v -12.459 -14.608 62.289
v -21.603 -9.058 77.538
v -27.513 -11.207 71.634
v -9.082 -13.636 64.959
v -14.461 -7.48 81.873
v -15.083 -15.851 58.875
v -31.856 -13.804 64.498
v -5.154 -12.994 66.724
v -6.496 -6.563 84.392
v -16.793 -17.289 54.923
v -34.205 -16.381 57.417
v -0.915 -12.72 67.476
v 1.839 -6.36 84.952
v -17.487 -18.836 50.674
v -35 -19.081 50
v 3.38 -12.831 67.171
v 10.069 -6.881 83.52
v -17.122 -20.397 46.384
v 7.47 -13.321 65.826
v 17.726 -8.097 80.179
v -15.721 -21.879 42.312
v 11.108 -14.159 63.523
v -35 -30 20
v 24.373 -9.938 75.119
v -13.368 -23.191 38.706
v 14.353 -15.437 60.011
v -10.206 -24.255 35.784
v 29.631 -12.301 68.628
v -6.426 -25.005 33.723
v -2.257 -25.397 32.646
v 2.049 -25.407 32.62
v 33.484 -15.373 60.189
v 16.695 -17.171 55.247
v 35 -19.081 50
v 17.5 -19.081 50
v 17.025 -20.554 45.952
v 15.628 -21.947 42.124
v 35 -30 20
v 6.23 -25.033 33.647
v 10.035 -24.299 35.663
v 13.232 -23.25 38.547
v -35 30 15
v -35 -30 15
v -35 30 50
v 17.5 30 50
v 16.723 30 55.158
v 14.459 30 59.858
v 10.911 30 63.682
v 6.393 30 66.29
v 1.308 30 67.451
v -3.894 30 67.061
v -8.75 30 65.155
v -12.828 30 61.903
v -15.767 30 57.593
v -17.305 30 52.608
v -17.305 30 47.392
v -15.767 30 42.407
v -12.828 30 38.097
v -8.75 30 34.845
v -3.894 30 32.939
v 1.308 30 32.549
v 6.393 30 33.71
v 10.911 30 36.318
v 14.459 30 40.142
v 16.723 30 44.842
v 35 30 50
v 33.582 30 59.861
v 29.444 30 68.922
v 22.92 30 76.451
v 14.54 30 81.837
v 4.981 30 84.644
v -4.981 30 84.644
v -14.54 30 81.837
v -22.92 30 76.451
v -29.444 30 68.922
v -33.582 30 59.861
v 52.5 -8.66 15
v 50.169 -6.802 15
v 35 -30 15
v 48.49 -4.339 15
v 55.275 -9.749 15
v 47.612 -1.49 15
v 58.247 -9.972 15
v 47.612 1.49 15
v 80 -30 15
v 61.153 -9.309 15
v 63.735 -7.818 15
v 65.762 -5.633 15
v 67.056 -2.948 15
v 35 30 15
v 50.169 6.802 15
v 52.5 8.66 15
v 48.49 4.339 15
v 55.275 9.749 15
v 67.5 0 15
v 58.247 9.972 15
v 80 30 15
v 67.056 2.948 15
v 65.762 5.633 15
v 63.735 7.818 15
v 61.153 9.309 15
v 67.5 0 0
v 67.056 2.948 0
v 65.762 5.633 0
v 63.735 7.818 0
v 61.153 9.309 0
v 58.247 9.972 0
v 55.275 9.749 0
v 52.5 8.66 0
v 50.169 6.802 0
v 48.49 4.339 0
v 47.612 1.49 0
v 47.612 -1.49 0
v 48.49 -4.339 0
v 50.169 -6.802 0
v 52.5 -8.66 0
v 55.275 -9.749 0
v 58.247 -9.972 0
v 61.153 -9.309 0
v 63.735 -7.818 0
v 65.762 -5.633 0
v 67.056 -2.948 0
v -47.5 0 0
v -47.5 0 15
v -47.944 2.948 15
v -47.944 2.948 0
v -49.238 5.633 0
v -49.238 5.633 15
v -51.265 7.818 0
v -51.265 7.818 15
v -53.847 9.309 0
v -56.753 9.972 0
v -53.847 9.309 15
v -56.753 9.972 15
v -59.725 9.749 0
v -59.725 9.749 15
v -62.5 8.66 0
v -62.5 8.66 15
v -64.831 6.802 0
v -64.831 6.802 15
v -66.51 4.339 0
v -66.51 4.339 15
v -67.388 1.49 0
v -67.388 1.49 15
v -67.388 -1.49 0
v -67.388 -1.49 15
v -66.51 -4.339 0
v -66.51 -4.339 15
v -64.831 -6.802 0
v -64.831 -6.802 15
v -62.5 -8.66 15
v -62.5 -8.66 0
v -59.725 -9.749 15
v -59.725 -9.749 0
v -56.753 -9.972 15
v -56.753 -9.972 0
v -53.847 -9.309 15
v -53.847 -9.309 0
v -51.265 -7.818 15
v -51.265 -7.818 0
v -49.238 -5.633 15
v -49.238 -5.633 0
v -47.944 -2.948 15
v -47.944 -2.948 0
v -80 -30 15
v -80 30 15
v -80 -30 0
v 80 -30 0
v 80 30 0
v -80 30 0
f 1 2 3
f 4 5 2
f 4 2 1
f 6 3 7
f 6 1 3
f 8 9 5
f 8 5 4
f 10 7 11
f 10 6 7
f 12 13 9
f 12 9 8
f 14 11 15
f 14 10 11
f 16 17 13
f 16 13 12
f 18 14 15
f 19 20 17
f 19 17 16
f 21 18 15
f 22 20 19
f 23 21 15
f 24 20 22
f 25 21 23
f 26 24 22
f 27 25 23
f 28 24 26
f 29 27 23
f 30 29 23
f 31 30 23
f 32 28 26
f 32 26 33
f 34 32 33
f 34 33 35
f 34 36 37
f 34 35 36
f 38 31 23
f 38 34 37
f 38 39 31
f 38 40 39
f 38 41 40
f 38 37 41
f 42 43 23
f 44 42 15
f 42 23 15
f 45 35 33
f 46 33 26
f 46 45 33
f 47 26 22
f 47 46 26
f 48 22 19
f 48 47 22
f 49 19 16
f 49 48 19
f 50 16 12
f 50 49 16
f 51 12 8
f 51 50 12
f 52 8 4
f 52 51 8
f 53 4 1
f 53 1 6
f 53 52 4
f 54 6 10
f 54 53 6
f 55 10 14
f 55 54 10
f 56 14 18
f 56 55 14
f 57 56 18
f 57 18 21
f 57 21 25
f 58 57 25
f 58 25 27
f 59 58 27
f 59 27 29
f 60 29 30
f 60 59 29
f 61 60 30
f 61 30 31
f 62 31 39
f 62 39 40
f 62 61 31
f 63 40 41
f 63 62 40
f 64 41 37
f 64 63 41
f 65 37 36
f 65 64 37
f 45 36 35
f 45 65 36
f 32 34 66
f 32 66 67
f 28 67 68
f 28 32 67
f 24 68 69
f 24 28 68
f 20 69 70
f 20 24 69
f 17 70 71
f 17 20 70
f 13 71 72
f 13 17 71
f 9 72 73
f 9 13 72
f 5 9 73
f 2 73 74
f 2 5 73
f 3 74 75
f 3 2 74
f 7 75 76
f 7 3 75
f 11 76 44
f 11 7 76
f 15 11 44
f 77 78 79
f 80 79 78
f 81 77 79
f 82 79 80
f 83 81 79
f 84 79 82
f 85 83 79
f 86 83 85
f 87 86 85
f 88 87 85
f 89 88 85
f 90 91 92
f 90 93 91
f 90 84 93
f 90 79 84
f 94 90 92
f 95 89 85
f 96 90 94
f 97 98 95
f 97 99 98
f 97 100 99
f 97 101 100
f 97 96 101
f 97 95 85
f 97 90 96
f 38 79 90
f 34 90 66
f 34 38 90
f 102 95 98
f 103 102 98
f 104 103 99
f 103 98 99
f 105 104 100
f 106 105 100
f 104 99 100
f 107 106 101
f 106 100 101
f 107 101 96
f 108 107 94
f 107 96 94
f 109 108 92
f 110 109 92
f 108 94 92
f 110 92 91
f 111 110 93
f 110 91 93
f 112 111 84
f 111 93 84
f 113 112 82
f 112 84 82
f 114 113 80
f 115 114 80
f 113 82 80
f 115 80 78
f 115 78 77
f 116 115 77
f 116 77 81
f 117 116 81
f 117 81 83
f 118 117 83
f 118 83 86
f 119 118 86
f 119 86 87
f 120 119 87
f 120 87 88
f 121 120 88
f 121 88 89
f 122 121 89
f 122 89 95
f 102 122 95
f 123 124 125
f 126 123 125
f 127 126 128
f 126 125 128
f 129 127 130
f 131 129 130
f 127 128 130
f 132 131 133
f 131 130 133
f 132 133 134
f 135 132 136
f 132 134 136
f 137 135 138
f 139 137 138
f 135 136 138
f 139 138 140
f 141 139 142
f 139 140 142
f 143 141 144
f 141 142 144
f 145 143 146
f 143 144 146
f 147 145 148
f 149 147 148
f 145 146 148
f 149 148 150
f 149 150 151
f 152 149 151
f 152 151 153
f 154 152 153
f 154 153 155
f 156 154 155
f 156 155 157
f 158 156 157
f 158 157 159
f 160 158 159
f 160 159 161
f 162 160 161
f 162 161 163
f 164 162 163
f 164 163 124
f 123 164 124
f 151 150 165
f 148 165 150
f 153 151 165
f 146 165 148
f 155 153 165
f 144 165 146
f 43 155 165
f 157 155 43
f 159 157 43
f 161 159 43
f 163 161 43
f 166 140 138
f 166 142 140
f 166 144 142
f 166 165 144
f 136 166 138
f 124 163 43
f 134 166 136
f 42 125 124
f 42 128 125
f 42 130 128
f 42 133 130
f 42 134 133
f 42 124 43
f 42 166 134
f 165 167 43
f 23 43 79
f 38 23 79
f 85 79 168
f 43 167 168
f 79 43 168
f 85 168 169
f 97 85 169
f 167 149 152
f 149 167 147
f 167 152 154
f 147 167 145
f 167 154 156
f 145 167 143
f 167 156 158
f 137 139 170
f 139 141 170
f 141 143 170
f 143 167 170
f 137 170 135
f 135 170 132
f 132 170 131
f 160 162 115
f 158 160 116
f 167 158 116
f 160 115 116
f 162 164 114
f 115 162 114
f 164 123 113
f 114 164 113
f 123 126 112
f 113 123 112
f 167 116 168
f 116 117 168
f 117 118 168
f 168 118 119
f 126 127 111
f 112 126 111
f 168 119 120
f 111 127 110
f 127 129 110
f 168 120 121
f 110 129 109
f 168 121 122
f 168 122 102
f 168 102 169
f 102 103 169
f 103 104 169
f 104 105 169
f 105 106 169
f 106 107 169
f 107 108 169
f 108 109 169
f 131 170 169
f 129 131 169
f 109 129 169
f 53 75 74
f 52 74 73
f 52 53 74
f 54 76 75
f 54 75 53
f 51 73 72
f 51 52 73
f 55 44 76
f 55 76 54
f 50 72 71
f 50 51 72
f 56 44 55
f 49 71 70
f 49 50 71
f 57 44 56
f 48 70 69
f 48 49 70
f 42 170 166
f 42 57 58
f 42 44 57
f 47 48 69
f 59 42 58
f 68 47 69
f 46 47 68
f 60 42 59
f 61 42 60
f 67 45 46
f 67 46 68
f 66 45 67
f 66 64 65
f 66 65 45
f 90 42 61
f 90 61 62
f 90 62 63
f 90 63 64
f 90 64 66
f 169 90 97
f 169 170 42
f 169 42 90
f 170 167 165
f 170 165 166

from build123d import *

# Parameters (mm, degrees)
SKETCH_W        = 160
SKETCH_H        = 60
PAD_DEPTH       = 15
SKETCH001_R     = 10
POCKET_DEPTH    = 15.001
SKETCH002_R     = 17.5
PAD001_DEPTH    = 30
POCKET001_DEPTH = 115.001


with BuildPart() as pocket:
    # Sketch → Pad (new body)
    with BuildSketch(Plane.XY):
        Rectangle(SKETCH_W, SKETCH_H)
    extrude(amount=PAD_DEPTH)

    # Sketch001 → Pocket (cut, through all)
    with BuildSketch(Plane.XY.offset(15)):
        with Locations((-57.5, 0)):
            Circle(SKETCH001_R)
        with Locations((57.5, 0)):
            Circle(SKETCH001_R)
    extrude(amount=-POCKET_DEPTH, mode=Mode.SUBTRACT)


with BuildPart() as pocket001:
    # Sketch002 → Pad001 (new body, symmetric)
    with BuildSketch(Plane.XZ):
        with BuildLine():
            ThreePointArc((35, 50), (0, 85), (-35, 50))
            Line((-35, 0), (-35, 50))
            Line((-35, 0), (35, 0))
            Line((35, 0), (35, 50))
        make_face()
        with Locations((0, 50)):
            Circle(SKETCH002_R, mode=Mode.SUBTRACT)
    extrude(amount=PAD001_DEPTH, both=True)

    # Fusion: union Pocket
    add(pocket.part)

    # Sketch003 → Pocket001 (cut, through all)
    with BuildSketch(Plane.YZ.offset(35)):
        Polygon((-30, 15), (-30, 95), (-2.638389, 95.17541), (-30, 20), align=None)
    extrude(amount=-POCKET001_DEPTH, mode=Mode.SUBTRACT)


solid = pocket001.part
